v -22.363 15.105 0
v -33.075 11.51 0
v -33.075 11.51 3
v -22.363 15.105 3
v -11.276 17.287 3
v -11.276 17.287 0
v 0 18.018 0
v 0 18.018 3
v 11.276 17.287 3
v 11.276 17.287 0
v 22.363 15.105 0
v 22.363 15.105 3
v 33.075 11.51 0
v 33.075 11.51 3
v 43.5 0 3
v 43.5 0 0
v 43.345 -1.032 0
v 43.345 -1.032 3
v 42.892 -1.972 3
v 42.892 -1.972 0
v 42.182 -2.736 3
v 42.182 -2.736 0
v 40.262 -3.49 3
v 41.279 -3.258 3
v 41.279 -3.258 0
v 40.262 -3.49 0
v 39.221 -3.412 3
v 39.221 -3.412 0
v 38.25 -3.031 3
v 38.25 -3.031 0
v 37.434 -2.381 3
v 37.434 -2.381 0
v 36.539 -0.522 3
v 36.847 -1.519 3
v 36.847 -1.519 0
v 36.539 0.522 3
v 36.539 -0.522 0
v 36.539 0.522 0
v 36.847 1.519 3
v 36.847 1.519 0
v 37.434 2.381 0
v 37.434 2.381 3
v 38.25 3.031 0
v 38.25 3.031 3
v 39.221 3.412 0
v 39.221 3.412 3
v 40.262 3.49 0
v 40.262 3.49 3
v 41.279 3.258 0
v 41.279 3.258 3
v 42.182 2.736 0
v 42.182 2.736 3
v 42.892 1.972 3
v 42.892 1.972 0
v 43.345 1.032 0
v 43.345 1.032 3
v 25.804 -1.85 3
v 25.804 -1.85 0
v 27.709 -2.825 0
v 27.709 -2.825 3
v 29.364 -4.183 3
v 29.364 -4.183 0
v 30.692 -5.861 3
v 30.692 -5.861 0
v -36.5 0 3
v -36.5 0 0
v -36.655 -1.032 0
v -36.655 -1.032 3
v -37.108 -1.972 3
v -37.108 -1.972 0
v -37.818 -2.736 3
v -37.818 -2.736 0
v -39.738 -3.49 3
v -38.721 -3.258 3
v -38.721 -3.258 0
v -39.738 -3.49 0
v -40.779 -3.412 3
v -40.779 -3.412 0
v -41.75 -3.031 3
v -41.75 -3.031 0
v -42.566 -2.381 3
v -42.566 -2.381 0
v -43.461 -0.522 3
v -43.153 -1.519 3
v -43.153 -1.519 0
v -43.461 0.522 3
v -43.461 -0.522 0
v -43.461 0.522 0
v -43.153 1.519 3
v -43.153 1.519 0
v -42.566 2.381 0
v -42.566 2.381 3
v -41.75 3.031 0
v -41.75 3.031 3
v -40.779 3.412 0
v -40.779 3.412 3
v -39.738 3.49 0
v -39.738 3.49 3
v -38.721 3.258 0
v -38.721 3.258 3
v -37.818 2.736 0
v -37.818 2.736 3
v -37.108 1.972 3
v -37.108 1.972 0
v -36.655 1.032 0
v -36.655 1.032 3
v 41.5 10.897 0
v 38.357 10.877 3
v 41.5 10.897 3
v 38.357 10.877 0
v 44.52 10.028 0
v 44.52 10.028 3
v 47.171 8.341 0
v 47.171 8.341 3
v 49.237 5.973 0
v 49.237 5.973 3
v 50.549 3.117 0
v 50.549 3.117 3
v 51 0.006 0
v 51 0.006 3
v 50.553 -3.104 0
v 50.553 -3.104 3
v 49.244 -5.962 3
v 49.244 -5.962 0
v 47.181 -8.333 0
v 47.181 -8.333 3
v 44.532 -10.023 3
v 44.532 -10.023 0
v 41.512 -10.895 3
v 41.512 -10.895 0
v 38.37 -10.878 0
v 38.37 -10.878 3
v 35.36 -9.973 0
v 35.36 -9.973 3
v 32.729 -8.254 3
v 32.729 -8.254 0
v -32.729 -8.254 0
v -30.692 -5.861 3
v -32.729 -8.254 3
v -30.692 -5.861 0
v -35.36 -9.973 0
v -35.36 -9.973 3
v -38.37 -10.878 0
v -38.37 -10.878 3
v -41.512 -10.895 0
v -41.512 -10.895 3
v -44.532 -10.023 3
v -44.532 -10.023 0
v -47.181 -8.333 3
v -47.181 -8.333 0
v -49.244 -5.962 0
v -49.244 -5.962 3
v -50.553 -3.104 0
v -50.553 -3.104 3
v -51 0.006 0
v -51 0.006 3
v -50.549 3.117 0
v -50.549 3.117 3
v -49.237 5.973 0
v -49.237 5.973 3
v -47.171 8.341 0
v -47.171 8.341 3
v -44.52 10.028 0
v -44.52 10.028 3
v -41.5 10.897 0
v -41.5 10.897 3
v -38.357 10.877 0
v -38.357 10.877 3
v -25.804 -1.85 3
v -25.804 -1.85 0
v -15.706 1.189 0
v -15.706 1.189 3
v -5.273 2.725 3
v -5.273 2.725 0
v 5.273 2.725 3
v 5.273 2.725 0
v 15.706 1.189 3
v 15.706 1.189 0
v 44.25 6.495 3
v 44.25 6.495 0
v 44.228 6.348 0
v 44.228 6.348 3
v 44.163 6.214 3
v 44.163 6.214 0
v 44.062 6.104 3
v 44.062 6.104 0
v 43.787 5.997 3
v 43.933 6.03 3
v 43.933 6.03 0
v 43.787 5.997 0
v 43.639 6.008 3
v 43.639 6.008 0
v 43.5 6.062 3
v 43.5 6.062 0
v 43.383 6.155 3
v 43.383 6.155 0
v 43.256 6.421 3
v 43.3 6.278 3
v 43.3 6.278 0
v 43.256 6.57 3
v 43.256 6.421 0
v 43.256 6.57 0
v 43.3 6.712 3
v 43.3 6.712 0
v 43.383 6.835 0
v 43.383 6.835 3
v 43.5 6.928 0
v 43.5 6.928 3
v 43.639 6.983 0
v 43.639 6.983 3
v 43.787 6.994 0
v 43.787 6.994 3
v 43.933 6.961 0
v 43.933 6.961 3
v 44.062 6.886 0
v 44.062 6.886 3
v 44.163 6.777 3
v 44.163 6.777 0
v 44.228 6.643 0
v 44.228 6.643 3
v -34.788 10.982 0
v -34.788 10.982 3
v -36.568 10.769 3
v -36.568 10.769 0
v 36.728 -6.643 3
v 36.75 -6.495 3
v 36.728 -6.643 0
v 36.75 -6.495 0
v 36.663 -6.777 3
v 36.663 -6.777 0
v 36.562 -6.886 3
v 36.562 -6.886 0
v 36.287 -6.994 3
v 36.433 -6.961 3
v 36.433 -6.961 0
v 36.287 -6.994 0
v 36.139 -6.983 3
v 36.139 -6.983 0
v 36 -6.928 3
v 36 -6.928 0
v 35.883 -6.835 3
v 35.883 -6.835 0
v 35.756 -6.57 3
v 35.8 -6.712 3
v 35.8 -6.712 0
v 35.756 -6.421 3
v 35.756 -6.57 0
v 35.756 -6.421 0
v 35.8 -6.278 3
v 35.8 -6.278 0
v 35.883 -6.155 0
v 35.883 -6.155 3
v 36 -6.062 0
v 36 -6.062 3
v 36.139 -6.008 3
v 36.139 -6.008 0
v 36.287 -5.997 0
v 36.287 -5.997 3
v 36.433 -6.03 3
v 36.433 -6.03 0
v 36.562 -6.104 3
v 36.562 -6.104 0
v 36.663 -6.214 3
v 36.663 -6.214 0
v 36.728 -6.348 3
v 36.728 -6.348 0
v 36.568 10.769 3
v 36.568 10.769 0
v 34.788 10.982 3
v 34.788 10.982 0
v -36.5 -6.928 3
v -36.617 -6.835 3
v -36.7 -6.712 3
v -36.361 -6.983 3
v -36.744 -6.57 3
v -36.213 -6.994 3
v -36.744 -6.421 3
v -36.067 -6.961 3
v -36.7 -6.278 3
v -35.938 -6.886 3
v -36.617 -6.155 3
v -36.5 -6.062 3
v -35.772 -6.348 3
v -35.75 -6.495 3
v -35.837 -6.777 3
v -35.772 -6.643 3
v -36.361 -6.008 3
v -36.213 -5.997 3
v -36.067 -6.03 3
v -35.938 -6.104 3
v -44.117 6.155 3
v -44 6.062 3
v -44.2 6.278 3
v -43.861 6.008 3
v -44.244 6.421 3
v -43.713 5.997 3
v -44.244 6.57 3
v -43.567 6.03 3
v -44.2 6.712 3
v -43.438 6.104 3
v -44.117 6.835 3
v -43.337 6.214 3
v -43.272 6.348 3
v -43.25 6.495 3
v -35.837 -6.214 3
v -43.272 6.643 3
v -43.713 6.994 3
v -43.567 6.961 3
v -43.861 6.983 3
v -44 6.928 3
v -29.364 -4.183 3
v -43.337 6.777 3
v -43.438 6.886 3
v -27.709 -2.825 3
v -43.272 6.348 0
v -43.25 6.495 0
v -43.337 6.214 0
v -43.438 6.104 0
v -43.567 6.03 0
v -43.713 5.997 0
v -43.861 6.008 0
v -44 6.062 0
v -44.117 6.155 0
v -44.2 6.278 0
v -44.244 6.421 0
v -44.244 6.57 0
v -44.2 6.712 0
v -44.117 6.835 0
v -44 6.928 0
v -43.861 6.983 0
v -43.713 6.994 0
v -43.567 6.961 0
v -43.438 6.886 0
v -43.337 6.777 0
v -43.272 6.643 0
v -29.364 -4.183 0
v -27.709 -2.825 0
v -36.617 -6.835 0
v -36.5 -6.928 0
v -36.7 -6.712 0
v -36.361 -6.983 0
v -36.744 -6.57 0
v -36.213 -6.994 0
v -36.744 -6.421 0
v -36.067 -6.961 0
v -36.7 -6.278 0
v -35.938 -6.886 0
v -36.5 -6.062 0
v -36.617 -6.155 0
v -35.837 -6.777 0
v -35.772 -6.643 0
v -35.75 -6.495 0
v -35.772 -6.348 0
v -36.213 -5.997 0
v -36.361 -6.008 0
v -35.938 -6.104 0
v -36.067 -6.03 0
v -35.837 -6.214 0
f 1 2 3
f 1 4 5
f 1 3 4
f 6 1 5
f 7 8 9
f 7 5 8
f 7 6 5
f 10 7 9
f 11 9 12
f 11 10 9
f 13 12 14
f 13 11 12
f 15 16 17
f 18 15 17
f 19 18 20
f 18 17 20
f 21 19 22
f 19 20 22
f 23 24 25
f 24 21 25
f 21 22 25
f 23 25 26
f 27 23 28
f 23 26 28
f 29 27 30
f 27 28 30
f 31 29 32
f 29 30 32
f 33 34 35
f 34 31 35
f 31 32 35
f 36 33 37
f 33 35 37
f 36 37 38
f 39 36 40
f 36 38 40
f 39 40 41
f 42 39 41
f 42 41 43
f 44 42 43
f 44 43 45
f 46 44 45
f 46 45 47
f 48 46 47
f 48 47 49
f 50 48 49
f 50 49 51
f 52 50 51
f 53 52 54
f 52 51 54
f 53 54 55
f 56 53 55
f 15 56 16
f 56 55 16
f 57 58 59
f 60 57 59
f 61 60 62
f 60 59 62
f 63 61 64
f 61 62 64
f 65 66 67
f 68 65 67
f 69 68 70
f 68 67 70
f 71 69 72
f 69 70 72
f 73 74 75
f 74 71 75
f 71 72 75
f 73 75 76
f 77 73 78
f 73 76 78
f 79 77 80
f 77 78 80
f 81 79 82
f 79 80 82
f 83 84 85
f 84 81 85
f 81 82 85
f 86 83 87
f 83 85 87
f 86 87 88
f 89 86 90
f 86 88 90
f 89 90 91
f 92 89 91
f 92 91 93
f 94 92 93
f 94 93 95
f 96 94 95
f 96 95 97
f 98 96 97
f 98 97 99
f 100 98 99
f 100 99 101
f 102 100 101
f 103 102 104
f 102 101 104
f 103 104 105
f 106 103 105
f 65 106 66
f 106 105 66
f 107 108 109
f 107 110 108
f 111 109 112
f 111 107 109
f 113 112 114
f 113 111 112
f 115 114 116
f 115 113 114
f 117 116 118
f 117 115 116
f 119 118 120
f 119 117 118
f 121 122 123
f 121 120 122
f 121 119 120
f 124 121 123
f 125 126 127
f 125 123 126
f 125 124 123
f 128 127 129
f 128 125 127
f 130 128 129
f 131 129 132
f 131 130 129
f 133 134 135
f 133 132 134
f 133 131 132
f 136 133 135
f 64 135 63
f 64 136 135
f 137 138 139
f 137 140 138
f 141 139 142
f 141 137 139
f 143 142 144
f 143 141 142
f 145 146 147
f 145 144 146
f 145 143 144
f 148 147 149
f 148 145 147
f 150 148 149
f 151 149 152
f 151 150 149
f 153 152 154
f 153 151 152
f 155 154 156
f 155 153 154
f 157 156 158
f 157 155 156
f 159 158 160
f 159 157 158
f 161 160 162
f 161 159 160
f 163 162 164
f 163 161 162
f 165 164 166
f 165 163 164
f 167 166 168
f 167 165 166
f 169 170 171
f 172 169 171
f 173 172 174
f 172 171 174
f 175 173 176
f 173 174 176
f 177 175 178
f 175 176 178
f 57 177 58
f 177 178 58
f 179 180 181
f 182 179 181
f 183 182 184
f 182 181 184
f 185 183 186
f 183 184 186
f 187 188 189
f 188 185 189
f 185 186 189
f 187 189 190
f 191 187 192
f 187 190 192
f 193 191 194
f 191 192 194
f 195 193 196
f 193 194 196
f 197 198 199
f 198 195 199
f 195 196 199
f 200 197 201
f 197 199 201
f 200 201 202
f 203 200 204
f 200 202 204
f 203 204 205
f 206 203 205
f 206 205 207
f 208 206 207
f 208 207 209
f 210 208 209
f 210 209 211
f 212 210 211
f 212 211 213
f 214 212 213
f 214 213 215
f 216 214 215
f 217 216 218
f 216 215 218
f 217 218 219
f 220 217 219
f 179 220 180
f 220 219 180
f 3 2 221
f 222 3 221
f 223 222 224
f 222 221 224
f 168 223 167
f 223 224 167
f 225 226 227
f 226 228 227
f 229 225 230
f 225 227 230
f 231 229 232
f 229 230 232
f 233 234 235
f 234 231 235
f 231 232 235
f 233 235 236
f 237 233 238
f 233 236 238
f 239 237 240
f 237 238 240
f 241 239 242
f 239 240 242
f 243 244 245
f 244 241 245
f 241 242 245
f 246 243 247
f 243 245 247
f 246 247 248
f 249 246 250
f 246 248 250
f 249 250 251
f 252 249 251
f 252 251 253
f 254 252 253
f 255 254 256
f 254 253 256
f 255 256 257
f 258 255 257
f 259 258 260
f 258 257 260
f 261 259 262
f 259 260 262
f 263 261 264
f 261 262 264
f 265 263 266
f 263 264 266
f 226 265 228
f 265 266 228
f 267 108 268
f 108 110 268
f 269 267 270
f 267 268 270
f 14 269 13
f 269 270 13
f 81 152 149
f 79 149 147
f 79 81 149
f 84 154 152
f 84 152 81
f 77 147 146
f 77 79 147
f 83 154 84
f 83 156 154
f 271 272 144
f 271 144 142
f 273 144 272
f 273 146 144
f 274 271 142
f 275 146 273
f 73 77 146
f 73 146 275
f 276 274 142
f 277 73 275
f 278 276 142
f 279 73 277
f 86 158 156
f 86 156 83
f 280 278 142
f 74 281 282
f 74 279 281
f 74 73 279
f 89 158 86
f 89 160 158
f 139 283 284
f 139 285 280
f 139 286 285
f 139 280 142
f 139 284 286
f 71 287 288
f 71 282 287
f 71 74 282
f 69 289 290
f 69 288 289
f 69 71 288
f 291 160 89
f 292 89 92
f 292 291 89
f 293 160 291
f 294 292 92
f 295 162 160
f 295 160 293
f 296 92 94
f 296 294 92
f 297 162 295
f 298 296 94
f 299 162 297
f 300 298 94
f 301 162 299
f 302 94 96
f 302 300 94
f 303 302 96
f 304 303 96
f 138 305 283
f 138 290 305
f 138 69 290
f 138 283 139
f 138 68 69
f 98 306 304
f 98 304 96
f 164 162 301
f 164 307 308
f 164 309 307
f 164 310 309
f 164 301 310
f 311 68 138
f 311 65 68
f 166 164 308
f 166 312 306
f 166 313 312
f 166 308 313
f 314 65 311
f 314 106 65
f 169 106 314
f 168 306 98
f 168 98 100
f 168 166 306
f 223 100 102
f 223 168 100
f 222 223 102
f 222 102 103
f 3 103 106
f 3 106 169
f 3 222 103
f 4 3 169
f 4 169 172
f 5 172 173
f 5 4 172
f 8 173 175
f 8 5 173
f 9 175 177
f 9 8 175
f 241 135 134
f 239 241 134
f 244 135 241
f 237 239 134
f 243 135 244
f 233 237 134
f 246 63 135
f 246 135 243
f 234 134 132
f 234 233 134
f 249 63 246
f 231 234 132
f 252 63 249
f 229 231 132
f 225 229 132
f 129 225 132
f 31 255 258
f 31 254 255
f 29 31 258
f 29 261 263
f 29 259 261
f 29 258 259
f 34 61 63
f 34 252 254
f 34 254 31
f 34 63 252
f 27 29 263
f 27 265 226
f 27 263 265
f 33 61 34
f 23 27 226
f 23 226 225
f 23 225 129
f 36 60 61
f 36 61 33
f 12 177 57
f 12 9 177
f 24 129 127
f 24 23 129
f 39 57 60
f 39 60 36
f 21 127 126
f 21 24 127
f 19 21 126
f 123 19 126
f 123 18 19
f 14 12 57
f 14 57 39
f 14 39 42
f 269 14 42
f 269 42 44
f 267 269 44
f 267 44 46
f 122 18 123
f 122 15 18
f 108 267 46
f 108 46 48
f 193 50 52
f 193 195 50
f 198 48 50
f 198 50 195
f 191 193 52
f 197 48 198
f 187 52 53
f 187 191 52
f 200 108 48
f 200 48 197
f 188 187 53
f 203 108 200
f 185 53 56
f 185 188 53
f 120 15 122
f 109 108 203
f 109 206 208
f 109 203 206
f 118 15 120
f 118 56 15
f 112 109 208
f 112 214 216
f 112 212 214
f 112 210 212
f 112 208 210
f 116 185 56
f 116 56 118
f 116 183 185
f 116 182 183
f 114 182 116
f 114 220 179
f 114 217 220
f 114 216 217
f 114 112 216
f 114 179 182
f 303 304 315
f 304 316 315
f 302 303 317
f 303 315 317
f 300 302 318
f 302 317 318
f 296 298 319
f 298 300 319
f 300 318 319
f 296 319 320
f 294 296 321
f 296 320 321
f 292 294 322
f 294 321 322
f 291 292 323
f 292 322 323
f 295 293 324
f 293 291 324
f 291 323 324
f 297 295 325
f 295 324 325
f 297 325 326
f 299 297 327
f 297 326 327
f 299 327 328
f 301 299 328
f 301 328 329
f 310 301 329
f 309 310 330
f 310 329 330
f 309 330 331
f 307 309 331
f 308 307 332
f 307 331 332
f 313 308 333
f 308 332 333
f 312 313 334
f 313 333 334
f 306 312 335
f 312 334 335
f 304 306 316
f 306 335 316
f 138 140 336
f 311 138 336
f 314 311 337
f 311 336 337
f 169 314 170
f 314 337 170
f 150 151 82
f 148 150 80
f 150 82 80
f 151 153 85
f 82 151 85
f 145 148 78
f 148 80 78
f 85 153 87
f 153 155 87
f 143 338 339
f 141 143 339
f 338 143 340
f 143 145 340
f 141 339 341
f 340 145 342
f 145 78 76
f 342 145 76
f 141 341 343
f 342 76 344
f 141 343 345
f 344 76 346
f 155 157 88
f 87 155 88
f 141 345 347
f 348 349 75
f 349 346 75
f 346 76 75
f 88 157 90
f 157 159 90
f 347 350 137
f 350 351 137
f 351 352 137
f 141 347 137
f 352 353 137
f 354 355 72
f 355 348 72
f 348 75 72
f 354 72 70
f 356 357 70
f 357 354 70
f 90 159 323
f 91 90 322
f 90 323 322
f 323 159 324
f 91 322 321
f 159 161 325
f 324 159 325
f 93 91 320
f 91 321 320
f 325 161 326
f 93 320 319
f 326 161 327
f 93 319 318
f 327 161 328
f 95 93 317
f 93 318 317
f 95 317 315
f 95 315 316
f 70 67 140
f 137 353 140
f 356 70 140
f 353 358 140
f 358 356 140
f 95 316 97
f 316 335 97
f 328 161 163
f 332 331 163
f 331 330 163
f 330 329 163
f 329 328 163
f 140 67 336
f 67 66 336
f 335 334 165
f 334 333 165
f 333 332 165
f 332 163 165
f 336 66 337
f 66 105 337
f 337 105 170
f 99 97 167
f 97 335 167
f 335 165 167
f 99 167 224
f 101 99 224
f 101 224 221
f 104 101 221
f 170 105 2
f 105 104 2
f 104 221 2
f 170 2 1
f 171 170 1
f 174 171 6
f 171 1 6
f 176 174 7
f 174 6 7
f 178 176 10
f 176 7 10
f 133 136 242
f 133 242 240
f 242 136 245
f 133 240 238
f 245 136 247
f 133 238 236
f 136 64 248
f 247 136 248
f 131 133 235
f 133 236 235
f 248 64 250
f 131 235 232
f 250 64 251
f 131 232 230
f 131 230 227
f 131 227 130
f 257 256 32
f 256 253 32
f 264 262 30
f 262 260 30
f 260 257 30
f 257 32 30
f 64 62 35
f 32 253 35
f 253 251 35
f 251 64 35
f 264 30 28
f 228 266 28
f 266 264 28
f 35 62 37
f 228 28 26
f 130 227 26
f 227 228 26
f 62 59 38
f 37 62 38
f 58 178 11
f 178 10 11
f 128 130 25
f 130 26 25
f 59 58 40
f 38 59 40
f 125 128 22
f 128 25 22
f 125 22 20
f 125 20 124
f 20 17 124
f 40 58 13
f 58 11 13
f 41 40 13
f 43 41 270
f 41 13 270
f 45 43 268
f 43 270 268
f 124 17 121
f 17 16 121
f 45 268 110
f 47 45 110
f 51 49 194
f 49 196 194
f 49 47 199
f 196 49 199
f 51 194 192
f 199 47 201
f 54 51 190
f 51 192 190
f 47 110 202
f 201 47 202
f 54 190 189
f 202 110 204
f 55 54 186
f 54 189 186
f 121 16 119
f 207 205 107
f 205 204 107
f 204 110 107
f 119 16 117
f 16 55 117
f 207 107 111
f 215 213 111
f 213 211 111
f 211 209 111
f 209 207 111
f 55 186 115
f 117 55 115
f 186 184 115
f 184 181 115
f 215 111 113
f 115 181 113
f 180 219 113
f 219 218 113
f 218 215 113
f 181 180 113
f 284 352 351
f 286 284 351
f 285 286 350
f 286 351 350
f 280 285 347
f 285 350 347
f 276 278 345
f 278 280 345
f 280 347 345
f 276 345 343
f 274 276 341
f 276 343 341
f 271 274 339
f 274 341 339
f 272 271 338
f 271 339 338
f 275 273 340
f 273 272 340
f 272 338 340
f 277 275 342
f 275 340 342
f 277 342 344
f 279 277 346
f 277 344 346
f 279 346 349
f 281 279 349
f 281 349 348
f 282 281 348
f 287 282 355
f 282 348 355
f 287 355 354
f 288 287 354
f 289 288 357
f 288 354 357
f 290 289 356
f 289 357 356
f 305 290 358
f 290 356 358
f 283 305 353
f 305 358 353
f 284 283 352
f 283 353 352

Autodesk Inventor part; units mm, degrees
ref_plane "YZ Plane" through (0, 0, 0) normal (1, 0, 0) x (0, 1, 0)
ref_plane "XZ Plane" through (0, 0, 0) normal (0, 1, 0) x (-1, 0, 0)
ref_plane "XY Plane" through (0, 0, 0) normal (0, 0, 1) x (1, 0, 0)
sketch "Sketch1" plane through (0, 0, 0) normal (0, 0, 1) x (1, 0, 0)
  line L0 (0, 107) -> (0, -103) construction
  line L1 (-117, 0) -> (116, 0) construction
  arc A0 (-38.3571, 10.8766) -> (-30.6918, -5.8614) centre (-40, 0) ccw
  arc A1 (30.6918, -5.8614) -> (38.3571, 10.8766) centre (40, 0) ccw
  arc A2 (40, 0) -> (-40, 0) centre (0, -69.282) ccw construction
  line L2 (-40, 13) -> (-40, -15) construction
  line L3 (40, 13) -> (40, -15) construction
  arc A3 (25.8036, -1.8505) -> (-25.8036, -1.8505) centre (0, -69.282) ccw
  arc A4 (33.0749, 11.5099) -> (-33.0749, 11.5099) centre (0, -69.282) ccw
  arc A5 (-38.3571, 10.8766) -> (-33.0749, 11.5099) centre (-36.8635, 20.7645) ccw
  arc A6 (-25.8036, -1.8505) -> (-30.6918, -5.8614) centre (-22.2297, -11.19) ccw
  arc A7 (33.0749, 11.5099) -> (38.3571, 10.8766) centre (36.8635, 20.7645) ccw
  arc A8 (30.6918, -5.8614) -> (25.8036, -1.8505) centre (22.2297, -11.19) ccw
  line L4 (-39.7655, 0.1354) -> (-60.5453, -11.8618) construction
  line L5 (-46.3958, 11.0778) -> (-33.6042, -11.0778) construction
  circle A9 centre (-43.75, 6.4952) radius 0.5
  circle A10 centre (-36.25, -6.4952) radius 0.5
  circle A11 centre (43.75, 6.4952) radius 0.5
  circle A12 centre (36.25, -6.4952) radius 0.5
  circle A13 centre (-40, 0) radius 3.5
  circle A14 centre (40, 0) radius 3.5
  point P0 (0, 0)
  dimension "d0" = 22
  dimension "d1" = 40
  dimension "d2" = 80
  dimension "d6" = 10
  dimension "d7" = 72.2
  dimension "d8" = 87.3
  dimension "d9" = 1
  dimension "d10" = 7.5
  dimension "d11" = 7
extrude "Extrusion1" add sketch "Sketch1" along normal blind 3
properties part number "Femur"
